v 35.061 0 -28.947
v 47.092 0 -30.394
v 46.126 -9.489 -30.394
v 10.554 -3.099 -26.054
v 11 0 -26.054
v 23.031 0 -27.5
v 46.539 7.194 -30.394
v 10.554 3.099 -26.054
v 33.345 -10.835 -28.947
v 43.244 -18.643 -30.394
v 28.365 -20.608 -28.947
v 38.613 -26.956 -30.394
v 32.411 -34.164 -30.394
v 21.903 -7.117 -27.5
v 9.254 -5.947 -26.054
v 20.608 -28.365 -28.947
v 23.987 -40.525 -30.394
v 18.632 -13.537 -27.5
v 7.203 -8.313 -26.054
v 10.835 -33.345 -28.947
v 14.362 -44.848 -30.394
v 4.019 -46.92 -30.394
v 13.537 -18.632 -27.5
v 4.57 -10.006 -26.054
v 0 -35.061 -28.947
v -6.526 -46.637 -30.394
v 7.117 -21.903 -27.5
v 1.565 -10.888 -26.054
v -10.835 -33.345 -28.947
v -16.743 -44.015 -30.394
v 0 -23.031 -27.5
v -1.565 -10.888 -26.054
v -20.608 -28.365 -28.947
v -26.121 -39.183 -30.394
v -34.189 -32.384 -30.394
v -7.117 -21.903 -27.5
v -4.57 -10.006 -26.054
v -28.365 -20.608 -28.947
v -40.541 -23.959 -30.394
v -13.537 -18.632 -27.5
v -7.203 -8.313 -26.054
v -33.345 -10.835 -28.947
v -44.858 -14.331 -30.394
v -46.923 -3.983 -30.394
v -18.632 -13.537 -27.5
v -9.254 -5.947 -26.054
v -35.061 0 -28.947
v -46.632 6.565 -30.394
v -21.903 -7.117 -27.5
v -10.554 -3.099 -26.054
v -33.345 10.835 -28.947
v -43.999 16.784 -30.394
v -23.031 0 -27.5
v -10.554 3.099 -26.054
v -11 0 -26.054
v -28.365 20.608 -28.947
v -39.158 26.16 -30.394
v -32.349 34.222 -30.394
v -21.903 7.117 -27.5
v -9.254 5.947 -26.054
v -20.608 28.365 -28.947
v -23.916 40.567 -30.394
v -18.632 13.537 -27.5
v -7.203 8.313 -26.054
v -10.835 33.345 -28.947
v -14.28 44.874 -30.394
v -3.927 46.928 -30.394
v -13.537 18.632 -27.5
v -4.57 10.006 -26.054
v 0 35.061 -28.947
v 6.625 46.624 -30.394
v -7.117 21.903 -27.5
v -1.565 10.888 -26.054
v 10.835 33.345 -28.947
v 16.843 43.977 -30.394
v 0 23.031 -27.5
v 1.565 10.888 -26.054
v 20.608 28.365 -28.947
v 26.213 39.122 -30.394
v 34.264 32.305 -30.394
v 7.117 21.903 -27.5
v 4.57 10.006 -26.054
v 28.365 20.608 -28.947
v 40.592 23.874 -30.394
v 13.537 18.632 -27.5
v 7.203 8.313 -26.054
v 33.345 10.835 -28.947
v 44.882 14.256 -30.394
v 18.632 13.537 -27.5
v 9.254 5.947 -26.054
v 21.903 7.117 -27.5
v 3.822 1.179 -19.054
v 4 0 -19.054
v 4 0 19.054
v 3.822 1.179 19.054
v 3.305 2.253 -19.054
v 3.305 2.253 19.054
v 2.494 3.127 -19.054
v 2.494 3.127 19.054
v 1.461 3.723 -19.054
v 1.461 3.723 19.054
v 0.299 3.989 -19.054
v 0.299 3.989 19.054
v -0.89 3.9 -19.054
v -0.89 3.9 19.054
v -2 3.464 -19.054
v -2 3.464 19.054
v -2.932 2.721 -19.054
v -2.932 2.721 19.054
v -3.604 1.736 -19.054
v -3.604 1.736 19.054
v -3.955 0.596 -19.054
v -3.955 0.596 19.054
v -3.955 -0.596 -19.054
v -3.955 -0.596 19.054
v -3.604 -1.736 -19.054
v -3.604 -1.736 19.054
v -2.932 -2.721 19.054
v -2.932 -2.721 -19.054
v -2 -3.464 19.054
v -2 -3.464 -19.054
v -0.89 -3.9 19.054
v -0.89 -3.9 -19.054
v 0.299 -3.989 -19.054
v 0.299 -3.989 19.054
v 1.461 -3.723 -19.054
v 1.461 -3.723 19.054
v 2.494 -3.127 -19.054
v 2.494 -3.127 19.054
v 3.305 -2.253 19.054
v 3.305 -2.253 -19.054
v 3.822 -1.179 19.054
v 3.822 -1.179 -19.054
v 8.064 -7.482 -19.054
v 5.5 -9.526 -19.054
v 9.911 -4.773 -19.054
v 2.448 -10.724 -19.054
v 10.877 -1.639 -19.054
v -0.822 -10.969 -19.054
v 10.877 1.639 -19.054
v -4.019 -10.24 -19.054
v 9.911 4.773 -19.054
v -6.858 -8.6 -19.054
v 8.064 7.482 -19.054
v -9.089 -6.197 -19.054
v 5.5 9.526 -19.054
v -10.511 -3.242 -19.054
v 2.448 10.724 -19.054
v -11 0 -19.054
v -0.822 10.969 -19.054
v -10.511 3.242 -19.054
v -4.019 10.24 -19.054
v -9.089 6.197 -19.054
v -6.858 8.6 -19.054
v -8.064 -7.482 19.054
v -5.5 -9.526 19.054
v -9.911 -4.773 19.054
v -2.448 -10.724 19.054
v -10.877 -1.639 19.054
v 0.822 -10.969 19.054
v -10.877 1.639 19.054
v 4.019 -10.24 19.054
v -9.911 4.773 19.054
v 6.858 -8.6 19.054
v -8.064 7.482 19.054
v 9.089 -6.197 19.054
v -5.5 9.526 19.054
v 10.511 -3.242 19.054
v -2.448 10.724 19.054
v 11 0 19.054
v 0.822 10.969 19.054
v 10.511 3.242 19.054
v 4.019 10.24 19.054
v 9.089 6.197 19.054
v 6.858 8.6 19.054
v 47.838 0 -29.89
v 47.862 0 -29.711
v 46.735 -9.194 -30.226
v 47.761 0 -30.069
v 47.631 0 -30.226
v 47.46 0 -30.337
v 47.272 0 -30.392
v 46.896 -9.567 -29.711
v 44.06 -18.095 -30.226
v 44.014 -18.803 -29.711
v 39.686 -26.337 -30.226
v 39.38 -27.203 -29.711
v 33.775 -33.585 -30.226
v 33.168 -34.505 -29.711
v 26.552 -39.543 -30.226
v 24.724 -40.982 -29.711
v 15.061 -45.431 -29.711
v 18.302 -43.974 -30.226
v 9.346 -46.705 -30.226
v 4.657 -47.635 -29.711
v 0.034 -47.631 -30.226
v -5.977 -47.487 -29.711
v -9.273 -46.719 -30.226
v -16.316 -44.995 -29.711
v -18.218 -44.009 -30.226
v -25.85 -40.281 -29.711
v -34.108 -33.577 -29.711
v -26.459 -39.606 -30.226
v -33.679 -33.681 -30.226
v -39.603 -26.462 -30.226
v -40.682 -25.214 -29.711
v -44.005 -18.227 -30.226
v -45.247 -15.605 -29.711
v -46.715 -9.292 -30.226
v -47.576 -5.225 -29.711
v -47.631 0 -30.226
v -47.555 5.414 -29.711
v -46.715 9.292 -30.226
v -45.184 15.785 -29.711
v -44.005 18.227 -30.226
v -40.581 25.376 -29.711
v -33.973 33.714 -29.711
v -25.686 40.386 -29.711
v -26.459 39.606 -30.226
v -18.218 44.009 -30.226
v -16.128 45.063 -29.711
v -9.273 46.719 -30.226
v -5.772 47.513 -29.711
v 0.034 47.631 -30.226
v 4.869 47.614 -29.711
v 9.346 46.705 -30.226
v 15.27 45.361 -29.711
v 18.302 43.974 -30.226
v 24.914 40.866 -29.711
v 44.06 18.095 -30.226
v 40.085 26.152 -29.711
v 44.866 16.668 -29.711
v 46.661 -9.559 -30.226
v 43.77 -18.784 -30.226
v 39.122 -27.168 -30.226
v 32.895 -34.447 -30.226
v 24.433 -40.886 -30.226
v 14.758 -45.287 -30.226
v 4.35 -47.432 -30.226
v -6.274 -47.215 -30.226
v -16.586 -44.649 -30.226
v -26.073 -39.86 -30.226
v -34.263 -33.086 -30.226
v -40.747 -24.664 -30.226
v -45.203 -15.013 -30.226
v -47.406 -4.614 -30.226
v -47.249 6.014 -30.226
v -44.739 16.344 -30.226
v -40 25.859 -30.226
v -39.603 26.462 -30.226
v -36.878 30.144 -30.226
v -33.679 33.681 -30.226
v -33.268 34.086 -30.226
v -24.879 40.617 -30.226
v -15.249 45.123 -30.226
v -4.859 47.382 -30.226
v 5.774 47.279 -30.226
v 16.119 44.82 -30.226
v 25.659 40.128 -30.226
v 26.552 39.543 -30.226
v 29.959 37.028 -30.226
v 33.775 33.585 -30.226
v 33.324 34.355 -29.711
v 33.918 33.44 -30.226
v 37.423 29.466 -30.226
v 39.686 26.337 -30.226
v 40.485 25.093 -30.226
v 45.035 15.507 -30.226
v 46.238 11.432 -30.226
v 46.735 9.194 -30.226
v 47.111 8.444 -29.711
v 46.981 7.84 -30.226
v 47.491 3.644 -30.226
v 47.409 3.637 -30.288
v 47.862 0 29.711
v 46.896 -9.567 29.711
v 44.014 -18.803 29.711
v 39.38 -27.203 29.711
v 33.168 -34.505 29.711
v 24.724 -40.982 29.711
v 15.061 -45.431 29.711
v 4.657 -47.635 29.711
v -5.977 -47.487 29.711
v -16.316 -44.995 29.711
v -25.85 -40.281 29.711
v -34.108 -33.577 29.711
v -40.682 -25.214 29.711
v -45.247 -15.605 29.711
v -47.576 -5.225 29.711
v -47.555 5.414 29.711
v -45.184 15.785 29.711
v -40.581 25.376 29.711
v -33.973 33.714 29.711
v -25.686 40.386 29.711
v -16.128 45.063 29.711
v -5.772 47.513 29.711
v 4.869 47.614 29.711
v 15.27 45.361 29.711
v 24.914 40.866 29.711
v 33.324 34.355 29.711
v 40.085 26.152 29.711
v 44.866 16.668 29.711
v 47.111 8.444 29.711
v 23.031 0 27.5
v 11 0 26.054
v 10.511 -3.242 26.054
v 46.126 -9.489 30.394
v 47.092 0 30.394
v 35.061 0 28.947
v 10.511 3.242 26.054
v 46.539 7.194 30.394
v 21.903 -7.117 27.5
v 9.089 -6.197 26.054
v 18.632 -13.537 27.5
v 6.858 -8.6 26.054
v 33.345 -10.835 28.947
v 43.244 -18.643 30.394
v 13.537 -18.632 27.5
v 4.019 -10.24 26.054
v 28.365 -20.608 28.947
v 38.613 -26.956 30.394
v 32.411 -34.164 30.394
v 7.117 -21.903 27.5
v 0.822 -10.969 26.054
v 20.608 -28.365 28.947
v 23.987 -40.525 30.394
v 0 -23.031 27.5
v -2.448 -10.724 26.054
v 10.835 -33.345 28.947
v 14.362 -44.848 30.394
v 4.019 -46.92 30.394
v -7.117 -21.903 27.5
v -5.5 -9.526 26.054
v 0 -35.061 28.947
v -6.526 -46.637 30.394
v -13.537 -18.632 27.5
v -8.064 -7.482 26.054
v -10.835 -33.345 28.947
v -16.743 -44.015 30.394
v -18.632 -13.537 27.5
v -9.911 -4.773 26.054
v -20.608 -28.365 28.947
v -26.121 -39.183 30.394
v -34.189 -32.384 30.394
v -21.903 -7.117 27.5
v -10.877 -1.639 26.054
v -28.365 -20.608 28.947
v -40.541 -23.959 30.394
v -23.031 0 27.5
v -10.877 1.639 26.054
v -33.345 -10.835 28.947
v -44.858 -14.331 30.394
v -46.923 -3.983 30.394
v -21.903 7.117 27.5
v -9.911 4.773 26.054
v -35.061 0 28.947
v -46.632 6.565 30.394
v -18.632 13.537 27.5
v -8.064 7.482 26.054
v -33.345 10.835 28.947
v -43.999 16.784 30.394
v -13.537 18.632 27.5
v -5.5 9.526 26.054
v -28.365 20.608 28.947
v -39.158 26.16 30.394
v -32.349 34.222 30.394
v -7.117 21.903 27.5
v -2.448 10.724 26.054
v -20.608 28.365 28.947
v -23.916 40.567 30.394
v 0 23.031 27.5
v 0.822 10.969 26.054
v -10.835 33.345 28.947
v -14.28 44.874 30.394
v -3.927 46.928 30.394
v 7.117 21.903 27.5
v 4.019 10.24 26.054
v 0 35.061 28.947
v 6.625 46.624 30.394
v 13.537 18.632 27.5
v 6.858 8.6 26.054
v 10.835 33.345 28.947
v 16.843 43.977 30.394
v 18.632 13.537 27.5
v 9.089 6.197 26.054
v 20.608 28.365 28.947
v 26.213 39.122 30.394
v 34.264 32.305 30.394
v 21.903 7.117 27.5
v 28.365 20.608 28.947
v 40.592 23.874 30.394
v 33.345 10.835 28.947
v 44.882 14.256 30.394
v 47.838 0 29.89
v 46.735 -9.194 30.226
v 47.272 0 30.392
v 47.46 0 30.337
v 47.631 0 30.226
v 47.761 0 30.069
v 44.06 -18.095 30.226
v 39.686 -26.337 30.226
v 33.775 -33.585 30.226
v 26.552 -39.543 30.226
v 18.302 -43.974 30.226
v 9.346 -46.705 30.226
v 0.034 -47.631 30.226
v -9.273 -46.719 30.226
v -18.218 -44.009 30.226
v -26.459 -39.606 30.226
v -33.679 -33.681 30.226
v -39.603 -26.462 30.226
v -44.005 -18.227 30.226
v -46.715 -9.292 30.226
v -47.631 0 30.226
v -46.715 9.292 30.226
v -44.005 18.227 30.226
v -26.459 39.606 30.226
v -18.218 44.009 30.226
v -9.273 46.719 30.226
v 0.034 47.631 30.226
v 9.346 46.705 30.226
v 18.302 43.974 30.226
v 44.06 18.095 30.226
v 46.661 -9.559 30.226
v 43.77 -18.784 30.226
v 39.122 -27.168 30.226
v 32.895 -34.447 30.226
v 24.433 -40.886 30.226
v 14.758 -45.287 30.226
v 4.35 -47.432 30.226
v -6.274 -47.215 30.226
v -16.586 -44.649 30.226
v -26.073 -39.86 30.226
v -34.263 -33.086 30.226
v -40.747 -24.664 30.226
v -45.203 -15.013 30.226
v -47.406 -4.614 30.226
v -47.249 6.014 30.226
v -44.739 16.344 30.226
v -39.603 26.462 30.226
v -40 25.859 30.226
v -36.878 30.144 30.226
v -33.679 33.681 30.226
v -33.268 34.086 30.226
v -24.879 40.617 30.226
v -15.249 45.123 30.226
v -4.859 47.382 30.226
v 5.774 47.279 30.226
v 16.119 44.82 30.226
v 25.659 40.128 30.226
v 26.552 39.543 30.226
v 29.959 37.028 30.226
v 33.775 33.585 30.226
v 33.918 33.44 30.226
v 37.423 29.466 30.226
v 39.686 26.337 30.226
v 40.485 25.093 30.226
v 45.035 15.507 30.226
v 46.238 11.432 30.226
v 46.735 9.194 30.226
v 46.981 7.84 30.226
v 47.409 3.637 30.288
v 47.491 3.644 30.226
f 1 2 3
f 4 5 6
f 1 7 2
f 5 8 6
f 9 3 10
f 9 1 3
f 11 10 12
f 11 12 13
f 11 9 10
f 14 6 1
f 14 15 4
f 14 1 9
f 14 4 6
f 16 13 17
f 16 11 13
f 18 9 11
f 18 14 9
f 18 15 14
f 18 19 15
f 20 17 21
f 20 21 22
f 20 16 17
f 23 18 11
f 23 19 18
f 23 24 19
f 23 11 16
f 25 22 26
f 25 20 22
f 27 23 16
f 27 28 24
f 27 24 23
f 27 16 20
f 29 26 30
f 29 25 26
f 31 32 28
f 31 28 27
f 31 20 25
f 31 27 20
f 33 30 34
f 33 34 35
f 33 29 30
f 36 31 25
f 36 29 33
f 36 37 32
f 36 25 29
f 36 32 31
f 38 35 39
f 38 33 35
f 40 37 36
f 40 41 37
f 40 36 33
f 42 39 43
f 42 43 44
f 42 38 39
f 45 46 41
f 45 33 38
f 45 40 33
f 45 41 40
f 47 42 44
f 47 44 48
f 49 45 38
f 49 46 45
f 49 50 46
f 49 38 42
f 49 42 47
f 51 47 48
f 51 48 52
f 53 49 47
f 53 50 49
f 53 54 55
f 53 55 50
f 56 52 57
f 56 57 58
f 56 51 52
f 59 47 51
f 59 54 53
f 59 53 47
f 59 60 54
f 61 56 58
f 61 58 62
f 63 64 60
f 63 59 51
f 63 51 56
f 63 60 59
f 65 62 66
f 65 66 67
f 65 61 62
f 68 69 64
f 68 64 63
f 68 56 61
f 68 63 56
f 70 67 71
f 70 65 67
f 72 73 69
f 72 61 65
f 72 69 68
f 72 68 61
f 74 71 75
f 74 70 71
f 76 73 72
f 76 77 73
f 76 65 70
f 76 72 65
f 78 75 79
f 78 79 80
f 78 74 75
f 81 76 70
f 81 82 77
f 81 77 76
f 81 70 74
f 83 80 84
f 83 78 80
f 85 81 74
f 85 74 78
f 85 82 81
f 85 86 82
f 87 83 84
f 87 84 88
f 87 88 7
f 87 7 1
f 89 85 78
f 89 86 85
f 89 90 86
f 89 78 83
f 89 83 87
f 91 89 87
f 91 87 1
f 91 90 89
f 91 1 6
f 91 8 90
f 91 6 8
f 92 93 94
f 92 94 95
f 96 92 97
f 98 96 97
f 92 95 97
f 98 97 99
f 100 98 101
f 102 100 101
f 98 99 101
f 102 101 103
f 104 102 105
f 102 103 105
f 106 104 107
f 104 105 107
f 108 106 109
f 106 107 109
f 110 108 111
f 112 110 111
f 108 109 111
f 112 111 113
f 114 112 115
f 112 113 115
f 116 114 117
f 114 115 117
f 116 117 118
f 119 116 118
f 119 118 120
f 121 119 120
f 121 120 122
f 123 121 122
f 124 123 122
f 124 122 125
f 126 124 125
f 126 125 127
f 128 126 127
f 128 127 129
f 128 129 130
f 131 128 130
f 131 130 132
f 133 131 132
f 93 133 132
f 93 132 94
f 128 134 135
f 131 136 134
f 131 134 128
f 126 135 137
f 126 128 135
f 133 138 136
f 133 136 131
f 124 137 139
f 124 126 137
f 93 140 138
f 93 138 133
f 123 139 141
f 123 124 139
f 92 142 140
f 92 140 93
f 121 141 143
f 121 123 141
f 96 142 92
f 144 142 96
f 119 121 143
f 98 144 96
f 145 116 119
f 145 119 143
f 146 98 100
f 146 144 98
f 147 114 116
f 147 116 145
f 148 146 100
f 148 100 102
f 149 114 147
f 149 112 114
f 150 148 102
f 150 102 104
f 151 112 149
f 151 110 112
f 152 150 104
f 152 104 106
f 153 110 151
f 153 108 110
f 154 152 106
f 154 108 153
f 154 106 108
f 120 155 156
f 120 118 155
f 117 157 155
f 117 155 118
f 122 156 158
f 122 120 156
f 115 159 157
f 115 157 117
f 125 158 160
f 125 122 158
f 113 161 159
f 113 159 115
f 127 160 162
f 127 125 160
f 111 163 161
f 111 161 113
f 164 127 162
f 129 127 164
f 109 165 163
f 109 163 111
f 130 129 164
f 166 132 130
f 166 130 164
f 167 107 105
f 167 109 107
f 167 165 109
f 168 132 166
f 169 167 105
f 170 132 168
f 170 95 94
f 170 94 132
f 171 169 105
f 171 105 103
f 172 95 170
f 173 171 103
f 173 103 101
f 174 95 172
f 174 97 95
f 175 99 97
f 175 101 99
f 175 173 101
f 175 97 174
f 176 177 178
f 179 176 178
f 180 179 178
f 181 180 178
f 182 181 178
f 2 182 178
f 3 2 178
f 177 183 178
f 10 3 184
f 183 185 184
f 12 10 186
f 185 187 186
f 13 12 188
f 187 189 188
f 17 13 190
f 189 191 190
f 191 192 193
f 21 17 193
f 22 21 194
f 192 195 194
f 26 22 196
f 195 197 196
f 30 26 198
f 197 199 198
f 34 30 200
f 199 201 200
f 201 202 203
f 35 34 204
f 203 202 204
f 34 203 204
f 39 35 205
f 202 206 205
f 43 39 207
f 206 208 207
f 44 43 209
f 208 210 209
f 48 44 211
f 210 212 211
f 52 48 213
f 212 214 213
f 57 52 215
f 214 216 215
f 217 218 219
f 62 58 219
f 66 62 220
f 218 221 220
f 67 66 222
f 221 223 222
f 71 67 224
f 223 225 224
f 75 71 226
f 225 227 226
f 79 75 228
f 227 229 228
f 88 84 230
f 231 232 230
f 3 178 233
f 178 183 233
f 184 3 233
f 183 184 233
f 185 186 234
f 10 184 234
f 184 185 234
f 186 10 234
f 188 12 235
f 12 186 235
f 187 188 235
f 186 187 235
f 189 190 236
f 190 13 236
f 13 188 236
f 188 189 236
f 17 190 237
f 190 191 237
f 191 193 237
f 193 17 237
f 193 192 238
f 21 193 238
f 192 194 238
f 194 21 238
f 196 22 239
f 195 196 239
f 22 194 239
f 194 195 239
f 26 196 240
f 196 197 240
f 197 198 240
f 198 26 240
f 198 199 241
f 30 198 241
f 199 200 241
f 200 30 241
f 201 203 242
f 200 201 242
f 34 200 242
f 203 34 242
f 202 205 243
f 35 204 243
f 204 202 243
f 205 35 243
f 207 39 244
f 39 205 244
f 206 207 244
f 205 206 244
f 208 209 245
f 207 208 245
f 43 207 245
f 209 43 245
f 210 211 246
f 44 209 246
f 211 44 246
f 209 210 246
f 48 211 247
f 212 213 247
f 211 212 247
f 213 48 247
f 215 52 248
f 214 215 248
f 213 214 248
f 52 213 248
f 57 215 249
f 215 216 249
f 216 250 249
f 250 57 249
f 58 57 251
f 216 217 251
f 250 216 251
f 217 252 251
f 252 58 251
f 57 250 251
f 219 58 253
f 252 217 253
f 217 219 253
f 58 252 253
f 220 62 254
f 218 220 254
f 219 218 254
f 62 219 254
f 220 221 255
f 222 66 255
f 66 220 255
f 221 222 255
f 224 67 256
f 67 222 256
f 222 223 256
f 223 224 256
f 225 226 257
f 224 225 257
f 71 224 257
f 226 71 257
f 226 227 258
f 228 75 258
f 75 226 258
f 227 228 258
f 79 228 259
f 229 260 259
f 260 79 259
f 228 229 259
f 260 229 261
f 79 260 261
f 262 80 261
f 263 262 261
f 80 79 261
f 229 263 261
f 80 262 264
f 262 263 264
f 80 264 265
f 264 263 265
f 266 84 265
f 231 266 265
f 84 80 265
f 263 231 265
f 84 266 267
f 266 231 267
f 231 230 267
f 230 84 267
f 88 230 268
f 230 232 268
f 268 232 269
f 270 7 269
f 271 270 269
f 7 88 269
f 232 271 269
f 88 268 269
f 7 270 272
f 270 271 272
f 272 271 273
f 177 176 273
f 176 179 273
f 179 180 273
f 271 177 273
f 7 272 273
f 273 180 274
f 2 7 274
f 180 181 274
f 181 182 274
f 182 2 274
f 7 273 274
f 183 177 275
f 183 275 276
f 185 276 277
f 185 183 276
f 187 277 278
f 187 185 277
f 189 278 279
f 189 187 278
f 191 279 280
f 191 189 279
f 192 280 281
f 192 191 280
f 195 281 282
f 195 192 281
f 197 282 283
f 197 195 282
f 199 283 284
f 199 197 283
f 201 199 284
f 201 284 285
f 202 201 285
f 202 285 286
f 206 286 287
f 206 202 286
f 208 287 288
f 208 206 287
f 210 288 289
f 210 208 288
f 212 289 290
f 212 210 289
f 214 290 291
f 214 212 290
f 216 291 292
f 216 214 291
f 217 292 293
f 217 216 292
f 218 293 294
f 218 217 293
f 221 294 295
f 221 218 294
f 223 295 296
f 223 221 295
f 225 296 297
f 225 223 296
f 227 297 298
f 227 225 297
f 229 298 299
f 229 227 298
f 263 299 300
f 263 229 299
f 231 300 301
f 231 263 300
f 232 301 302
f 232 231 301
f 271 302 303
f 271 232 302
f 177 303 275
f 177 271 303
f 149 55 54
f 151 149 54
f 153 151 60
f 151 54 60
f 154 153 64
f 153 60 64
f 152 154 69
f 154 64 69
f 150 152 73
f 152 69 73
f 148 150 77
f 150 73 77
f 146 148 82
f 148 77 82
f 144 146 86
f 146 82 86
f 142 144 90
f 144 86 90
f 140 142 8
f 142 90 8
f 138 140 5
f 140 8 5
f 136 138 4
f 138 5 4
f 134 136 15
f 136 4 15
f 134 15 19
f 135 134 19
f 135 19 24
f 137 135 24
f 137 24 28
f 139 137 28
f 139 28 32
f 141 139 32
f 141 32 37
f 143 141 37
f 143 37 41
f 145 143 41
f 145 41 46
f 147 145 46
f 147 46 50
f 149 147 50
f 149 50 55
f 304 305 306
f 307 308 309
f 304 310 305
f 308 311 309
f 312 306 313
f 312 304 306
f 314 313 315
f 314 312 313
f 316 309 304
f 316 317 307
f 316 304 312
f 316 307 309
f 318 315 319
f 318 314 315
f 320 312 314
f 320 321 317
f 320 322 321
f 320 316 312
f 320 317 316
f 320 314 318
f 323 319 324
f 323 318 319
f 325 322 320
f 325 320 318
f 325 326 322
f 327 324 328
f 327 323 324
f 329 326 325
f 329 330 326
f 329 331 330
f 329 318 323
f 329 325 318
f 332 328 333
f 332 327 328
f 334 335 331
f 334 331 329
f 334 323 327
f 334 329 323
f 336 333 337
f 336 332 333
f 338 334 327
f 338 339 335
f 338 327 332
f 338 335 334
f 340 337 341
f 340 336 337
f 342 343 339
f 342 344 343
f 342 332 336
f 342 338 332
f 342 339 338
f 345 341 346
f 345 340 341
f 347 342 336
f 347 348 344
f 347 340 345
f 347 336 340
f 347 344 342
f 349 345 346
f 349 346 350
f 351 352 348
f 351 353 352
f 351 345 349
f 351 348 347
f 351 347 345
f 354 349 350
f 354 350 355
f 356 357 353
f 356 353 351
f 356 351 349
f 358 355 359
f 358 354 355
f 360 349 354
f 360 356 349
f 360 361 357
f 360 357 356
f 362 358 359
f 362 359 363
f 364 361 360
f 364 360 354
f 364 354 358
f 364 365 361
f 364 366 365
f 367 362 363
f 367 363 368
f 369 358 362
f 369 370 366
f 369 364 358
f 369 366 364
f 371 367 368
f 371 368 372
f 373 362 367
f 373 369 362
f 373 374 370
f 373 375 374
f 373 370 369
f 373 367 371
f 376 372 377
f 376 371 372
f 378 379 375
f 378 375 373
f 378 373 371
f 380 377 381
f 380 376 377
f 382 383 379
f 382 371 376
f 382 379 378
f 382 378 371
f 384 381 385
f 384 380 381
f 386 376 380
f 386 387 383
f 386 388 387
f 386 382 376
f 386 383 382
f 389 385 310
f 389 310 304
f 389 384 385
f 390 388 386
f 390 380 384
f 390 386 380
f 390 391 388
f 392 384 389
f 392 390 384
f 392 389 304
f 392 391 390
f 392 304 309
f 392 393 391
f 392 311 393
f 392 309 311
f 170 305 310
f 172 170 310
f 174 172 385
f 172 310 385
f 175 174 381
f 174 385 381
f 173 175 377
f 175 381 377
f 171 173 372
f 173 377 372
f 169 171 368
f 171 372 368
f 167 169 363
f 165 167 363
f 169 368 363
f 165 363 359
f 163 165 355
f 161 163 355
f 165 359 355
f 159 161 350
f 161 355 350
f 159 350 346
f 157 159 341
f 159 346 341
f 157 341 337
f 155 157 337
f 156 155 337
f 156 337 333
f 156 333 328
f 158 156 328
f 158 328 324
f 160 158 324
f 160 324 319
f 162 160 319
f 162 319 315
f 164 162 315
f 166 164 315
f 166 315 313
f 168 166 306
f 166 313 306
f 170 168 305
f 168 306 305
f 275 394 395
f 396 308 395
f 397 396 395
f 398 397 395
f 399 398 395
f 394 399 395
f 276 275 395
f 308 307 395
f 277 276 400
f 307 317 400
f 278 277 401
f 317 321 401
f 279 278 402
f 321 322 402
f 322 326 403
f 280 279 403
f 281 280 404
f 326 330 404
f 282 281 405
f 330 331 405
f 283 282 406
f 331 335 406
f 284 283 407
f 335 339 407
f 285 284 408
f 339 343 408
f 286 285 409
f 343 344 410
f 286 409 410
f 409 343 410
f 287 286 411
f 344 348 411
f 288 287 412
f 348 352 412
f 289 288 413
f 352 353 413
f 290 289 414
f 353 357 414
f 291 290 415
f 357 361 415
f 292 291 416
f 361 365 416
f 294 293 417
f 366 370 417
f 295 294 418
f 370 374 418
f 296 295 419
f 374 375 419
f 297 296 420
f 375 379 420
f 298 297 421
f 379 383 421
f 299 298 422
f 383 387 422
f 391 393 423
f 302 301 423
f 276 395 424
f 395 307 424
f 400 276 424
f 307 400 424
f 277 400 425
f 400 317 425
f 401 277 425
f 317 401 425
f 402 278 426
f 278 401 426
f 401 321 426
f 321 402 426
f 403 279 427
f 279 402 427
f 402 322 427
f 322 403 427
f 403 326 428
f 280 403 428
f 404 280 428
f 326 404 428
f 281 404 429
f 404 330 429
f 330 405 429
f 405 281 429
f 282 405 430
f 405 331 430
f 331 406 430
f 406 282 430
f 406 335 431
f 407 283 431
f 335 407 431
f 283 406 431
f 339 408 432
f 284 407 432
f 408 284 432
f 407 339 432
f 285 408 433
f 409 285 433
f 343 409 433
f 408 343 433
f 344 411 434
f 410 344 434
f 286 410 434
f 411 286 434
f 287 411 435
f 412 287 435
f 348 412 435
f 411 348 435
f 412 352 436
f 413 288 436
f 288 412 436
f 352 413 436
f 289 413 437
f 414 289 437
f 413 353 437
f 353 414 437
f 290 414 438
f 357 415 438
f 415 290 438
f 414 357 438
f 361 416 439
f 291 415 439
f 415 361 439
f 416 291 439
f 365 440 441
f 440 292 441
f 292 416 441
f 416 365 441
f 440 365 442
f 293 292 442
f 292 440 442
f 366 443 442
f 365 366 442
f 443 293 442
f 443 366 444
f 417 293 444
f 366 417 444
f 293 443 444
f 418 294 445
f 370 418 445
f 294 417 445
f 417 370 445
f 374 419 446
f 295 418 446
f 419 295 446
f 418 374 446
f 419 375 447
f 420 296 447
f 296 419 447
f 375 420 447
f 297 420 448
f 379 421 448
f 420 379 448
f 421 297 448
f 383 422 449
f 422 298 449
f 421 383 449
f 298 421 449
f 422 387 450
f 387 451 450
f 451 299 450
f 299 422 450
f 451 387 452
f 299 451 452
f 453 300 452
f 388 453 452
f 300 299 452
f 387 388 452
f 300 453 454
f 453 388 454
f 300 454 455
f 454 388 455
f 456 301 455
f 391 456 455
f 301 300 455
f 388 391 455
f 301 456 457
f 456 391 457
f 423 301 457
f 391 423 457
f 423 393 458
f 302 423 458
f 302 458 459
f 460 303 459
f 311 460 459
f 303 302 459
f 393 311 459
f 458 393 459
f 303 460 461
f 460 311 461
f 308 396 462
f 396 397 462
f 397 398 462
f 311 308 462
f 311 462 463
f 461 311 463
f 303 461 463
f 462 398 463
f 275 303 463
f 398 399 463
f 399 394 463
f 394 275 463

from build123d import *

# Parameters (mm, degrees)
SKETCH1_W          = 11
SKETCH1_H          = 52.107075314
SKETCH3_R          = 11
CUT_EXTRUDE1_DEPTH = 7
SKETCH4_R          = 4
CUT_EXTRUDE2_DEPTH = 50.540387657
SKETCH5_R          = 11
CUT_EXTRUDE3_DEPTH = 7
FILLET2_R          = 0.688


with BuildPart() as part:
    # Sketch1 → Revolve1 (revolve)
    with BuildSketch(Plane(origin=(0, 0, 0), x_dir=(1, 0, 0), z_dir=(0, 1, 0))):
        with Locations((5.5, 0)):
            Rectangle(SKETCH1_W, SKETCH1_H)
        Polygon((11, 26.053537657), (11, -26.053537657), (47.862, -30.48685), (47.862, 30.48685), align=None)
    revolve(axis=Axis((0, 0, 26.053537657), (0, 0, -1)))

    # Sketch3 → Cut-Extrude1 (cut)
    with BuildSketch(Plane.XY.offset(26.053537657)):
        Circle(SKETCH3_R)
    extrude(amount=-CUT_EXTRUDE1_DEPTH, mode=Mode.SUBTRACT)

    # Sketch4 → Cut-Extrude2 (cut, through all)
    with BuildSketch(Plane.XY.offset(19.053537657)):
        Circle(SKETCH4_R)
    extrude(amount=-CUT_EXTRUDE2_DEPTH, mode=Mode.SUBTRACT)

    # Sketch5 → Cut-Extrude3 (cut)
    with BuildSketch(Plane(origin=(0, 0, -26.053537657), x_dir=(-1, 0, 0), z_dir=(0, 0, -1))):
        Circle(SKETCH5_R)
    extrude(amount=-CUT_EXTRUDE3_DEPTH, mode=Mode.SUBTRACT)

    # Fillet2
    fillet2_edges = [part.edges().sort_by_distance(p)[0] for p in [
        (-47.862, 0, -30.48685),
        (-47.862, 0, 30.48685),
    ]]
    fillet(fillet2_edges, radius=FILLET2_R)


solid = part.part
